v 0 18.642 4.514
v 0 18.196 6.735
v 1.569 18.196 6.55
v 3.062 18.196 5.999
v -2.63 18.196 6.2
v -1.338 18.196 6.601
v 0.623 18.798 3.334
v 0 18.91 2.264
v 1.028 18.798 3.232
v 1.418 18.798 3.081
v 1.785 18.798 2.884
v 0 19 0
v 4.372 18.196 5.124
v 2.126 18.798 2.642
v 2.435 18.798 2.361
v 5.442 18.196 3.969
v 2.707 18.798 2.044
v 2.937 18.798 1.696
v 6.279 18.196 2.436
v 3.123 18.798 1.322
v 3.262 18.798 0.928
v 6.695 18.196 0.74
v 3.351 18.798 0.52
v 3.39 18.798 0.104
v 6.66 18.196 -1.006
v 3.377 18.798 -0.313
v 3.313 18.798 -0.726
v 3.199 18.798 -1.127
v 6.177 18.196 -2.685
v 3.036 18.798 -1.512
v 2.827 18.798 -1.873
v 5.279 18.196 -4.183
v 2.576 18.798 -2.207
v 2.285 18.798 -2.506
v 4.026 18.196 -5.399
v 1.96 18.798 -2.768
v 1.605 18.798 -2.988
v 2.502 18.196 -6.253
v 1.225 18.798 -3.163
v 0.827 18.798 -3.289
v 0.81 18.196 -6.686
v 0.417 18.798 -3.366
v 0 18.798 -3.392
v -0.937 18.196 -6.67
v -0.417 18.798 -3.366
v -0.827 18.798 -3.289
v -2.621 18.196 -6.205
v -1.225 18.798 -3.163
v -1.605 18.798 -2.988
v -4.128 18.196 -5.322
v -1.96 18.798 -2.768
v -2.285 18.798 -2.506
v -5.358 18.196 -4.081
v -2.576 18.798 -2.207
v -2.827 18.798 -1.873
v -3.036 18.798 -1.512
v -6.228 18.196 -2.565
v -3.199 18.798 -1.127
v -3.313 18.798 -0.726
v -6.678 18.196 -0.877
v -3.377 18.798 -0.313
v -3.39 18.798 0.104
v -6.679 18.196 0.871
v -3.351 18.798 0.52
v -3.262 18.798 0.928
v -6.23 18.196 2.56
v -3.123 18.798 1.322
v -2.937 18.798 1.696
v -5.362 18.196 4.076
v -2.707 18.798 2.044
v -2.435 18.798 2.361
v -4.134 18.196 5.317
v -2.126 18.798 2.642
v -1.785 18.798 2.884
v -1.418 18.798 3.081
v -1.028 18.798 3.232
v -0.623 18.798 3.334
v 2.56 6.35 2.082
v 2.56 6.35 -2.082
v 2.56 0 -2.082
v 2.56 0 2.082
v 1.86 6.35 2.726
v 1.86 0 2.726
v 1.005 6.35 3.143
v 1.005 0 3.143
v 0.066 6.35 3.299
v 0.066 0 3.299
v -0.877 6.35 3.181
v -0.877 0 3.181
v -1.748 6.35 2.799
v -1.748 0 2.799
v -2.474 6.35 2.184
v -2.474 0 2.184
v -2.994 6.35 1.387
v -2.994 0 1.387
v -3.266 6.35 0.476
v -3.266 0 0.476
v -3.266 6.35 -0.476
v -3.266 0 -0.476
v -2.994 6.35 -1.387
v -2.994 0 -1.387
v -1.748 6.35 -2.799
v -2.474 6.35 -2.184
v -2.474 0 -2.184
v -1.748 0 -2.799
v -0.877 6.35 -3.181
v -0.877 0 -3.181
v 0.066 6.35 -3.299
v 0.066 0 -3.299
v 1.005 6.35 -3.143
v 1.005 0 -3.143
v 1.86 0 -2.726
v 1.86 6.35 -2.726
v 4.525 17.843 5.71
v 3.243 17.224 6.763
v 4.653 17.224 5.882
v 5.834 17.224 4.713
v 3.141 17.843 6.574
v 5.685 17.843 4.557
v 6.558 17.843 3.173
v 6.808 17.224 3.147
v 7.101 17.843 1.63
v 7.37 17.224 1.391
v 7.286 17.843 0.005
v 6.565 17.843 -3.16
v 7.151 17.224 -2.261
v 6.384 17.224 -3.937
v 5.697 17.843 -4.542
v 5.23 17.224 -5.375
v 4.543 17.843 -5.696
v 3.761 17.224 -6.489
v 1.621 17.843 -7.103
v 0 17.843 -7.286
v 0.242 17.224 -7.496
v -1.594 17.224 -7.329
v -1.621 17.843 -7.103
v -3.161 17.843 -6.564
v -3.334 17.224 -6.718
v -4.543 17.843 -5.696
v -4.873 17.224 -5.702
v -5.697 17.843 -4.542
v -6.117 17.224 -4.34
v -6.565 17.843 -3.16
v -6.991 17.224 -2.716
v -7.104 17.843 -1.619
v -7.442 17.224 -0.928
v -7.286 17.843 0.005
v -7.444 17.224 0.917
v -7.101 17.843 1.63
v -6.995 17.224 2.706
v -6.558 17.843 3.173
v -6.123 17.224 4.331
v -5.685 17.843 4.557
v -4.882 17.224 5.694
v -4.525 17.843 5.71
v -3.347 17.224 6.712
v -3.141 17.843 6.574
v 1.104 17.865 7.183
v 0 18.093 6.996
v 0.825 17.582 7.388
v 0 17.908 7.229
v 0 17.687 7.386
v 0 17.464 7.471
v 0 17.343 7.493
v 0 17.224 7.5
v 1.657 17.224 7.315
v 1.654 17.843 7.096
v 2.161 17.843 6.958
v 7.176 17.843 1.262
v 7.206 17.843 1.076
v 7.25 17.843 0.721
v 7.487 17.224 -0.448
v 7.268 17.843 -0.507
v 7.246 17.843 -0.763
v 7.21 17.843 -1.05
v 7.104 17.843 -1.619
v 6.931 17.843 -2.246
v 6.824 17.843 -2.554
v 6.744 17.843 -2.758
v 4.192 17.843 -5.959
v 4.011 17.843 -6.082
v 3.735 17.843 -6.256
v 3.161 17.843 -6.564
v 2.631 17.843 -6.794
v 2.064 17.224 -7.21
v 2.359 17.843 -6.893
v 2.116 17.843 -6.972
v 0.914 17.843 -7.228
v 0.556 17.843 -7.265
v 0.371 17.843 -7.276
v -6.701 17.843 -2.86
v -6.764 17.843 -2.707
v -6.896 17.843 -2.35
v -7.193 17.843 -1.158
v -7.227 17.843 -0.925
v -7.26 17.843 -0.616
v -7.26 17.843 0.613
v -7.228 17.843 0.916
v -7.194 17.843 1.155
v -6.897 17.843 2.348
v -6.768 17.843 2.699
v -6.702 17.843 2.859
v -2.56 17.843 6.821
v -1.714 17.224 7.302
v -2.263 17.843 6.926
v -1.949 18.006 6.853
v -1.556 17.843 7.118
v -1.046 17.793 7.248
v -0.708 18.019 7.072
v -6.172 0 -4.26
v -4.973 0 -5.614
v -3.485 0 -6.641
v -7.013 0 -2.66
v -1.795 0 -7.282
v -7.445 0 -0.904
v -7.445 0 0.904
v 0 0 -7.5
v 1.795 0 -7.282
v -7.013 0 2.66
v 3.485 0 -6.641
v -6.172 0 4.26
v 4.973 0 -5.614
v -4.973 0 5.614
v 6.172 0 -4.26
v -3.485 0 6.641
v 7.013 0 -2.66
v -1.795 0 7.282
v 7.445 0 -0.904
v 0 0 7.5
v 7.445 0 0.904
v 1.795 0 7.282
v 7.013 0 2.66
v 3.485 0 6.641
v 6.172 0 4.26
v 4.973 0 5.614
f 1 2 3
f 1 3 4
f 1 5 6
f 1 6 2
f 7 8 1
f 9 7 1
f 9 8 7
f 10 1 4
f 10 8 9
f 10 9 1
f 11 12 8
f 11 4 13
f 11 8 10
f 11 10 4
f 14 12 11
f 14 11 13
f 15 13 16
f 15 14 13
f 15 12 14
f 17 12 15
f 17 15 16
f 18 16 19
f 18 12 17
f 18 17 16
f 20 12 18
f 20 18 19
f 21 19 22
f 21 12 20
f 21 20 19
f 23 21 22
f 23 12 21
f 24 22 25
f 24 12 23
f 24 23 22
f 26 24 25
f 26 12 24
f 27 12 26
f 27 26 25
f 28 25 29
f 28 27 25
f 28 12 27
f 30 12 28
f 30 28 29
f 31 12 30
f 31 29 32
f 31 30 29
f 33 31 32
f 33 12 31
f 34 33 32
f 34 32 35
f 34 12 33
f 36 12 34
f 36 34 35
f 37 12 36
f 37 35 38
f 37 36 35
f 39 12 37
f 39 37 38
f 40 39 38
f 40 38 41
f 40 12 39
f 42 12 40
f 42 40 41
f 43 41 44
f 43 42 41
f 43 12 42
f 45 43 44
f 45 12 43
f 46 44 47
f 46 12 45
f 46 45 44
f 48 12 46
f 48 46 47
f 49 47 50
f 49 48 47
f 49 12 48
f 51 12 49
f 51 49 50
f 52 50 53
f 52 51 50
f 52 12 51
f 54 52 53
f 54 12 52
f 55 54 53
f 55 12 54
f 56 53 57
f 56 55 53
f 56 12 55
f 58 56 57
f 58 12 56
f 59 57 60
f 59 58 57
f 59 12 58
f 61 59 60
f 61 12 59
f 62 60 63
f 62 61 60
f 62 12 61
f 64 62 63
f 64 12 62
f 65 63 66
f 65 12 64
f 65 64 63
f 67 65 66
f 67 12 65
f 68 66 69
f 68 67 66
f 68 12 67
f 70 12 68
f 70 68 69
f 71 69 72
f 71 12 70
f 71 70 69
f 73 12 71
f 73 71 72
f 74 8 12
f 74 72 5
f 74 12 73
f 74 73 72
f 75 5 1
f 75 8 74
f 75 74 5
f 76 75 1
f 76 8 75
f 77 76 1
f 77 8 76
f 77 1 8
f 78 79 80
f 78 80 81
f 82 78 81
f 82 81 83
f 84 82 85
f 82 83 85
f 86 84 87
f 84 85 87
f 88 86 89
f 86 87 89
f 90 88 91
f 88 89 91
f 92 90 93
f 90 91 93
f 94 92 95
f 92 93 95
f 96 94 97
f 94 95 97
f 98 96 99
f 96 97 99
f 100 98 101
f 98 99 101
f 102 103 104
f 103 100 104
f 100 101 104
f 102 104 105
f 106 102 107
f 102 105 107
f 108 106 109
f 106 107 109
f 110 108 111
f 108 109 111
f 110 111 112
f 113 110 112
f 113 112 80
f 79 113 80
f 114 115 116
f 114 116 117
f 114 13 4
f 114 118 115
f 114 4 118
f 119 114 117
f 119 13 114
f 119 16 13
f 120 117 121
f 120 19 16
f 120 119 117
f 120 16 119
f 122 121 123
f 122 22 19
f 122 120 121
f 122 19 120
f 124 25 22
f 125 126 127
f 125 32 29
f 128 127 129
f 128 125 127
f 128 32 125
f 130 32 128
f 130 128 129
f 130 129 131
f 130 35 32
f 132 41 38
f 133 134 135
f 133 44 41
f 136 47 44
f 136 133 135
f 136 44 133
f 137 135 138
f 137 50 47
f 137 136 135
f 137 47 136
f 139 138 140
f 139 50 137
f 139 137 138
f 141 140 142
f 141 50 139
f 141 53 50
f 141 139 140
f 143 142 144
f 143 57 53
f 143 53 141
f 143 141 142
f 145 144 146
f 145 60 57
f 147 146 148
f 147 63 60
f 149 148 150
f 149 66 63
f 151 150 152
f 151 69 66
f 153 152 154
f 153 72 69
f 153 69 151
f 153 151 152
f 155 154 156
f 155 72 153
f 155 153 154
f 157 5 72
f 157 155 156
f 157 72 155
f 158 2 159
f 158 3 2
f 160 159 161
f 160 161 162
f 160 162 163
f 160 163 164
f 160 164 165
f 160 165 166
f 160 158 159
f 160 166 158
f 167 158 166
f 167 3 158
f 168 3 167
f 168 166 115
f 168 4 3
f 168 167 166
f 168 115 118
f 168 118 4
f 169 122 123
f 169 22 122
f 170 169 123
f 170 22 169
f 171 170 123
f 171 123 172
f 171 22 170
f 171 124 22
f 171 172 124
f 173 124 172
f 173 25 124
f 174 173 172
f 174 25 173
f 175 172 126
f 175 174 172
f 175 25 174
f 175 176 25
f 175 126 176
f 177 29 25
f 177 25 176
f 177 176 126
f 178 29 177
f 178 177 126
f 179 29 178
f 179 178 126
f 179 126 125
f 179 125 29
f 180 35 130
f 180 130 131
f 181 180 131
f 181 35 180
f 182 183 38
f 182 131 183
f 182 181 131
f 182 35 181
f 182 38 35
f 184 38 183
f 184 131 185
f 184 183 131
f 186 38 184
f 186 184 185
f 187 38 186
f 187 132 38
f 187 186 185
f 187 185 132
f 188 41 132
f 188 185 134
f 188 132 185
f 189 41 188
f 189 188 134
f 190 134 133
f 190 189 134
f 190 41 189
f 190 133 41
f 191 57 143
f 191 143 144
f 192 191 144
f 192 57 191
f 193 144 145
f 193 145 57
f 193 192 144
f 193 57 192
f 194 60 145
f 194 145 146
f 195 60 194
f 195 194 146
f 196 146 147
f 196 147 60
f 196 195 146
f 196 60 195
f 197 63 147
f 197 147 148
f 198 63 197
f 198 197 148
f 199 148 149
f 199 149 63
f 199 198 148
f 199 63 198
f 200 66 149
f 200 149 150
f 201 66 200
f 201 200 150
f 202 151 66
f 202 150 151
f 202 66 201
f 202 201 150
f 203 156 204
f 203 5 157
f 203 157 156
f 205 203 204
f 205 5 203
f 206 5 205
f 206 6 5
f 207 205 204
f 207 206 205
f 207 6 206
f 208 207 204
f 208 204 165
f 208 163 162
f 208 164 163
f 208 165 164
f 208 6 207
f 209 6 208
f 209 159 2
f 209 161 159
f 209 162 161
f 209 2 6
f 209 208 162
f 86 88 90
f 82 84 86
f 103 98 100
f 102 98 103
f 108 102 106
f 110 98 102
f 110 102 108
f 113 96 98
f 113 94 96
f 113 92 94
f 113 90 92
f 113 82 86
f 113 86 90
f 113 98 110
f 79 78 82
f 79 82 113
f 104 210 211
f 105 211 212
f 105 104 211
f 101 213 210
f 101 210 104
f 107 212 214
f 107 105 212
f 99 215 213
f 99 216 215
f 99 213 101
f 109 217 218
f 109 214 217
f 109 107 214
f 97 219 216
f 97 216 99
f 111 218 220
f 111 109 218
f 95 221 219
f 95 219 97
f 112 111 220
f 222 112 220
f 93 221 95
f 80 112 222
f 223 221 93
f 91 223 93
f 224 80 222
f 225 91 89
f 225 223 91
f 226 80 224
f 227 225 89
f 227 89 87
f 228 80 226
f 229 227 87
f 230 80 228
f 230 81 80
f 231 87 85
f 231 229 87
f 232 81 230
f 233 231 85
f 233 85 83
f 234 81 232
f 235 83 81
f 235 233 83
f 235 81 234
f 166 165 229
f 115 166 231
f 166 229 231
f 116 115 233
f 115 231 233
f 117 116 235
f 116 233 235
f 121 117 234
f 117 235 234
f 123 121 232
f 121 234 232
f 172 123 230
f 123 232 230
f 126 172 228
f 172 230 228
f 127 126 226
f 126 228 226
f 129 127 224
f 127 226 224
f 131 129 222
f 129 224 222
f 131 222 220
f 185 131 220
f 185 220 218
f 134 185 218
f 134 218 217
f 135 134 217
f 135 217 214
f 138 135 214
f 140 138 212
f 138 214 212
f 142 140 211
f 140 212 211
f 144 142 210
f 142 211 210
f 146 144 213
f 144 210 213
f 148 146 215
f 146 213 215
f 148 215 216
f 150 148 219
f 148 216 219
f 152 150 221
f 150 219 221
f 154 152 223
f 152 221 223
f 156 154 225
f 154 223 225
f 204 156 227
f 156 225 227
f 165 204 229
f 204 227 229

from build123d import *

# Parameters (mm, degrees)
SKETCH1_R           = 7.5
BOSS_EXTRUDE1_DEPTH = 18
DOME1_FACE_RADIUS   = 7.5
DOME1_HEIGHT        = 1
FILLET1_R           = 1
SKETCH2_R           = 3.3
CUT_EXTRUDE1_DEPTH  = 6.35
SKETCH3_W           = 1.48
SKETCH3_H           = 4.164804918
BOSS_EXTRUDE2_DEPTH = 6.35


with BuildPart() as part:
    # Sketch1 → Boss-Extrude1 (new body)
    with BuildSketch(Plane(origin=(0, 0, 0), x_dir=(1, 0, 0), z_dir=(0, 1, 0))):
        with Locations(Location((0, 0, 0), (0, 0, 270))):
            Circle(SKETCH1_R)
    extrude(amount=BOSS_EXTRUDE1_DEPTH)

    # Dome1: a dome of height H over a round flat face of radius A is a cap of a sphere of radius (A * A + H * H) / (2 * H)
    dome1_r = (DOME1_FACE_RADIUS * DOME1_FACE_RADIUS + DOME1_HEIGHT * DOME1_HEIGHT) / (2 * DOME1_HEIGHT)
    dome1_base = Plane((0, 18, 0), z_dir=(0, 1, 0))
    with Locations(dome1_base.offset(DOME1_HEIGHT - dome1_r)):
        dome1_ball = Sphere(dome1_r, mode=Mode.PRIVATE)
    add(split(dome1_ball, bisect_by=dome1_base, keep=Keep.TOP, mode=Mode.PRIVATE))

    # Fillet1
    fillet1_edges = [part.edges().sort_by_distance(p)[0] for p in [
        (0, 18, -7.5),
    ]]
    fillet(fillet1_edges, radius=FILLET1_R)

    # Sketch2 → Cut-Extrude1 (cut)
    with BuildSketch(Plane.XZ):
        with Locations(Location((0, 0, 0), (0, 0, 270))):
            Circle(SKETCH2_R)
    extrude(amount=-CUT_EXTRUDE1_DEPTH, mode=Mode.SUBTRACT)

    # Sketch3 → Boss-Extrude2 (add)
    with BuildSketch(Plane.XZ.offset(-6.35)):
        with Locations((3.3, 0)):
            Rectangle(SKETCH3_W, SKETCH3_H)
    extrude(amount=BOSS_EXTRUDE2_DEPTH)


solid = part.part
